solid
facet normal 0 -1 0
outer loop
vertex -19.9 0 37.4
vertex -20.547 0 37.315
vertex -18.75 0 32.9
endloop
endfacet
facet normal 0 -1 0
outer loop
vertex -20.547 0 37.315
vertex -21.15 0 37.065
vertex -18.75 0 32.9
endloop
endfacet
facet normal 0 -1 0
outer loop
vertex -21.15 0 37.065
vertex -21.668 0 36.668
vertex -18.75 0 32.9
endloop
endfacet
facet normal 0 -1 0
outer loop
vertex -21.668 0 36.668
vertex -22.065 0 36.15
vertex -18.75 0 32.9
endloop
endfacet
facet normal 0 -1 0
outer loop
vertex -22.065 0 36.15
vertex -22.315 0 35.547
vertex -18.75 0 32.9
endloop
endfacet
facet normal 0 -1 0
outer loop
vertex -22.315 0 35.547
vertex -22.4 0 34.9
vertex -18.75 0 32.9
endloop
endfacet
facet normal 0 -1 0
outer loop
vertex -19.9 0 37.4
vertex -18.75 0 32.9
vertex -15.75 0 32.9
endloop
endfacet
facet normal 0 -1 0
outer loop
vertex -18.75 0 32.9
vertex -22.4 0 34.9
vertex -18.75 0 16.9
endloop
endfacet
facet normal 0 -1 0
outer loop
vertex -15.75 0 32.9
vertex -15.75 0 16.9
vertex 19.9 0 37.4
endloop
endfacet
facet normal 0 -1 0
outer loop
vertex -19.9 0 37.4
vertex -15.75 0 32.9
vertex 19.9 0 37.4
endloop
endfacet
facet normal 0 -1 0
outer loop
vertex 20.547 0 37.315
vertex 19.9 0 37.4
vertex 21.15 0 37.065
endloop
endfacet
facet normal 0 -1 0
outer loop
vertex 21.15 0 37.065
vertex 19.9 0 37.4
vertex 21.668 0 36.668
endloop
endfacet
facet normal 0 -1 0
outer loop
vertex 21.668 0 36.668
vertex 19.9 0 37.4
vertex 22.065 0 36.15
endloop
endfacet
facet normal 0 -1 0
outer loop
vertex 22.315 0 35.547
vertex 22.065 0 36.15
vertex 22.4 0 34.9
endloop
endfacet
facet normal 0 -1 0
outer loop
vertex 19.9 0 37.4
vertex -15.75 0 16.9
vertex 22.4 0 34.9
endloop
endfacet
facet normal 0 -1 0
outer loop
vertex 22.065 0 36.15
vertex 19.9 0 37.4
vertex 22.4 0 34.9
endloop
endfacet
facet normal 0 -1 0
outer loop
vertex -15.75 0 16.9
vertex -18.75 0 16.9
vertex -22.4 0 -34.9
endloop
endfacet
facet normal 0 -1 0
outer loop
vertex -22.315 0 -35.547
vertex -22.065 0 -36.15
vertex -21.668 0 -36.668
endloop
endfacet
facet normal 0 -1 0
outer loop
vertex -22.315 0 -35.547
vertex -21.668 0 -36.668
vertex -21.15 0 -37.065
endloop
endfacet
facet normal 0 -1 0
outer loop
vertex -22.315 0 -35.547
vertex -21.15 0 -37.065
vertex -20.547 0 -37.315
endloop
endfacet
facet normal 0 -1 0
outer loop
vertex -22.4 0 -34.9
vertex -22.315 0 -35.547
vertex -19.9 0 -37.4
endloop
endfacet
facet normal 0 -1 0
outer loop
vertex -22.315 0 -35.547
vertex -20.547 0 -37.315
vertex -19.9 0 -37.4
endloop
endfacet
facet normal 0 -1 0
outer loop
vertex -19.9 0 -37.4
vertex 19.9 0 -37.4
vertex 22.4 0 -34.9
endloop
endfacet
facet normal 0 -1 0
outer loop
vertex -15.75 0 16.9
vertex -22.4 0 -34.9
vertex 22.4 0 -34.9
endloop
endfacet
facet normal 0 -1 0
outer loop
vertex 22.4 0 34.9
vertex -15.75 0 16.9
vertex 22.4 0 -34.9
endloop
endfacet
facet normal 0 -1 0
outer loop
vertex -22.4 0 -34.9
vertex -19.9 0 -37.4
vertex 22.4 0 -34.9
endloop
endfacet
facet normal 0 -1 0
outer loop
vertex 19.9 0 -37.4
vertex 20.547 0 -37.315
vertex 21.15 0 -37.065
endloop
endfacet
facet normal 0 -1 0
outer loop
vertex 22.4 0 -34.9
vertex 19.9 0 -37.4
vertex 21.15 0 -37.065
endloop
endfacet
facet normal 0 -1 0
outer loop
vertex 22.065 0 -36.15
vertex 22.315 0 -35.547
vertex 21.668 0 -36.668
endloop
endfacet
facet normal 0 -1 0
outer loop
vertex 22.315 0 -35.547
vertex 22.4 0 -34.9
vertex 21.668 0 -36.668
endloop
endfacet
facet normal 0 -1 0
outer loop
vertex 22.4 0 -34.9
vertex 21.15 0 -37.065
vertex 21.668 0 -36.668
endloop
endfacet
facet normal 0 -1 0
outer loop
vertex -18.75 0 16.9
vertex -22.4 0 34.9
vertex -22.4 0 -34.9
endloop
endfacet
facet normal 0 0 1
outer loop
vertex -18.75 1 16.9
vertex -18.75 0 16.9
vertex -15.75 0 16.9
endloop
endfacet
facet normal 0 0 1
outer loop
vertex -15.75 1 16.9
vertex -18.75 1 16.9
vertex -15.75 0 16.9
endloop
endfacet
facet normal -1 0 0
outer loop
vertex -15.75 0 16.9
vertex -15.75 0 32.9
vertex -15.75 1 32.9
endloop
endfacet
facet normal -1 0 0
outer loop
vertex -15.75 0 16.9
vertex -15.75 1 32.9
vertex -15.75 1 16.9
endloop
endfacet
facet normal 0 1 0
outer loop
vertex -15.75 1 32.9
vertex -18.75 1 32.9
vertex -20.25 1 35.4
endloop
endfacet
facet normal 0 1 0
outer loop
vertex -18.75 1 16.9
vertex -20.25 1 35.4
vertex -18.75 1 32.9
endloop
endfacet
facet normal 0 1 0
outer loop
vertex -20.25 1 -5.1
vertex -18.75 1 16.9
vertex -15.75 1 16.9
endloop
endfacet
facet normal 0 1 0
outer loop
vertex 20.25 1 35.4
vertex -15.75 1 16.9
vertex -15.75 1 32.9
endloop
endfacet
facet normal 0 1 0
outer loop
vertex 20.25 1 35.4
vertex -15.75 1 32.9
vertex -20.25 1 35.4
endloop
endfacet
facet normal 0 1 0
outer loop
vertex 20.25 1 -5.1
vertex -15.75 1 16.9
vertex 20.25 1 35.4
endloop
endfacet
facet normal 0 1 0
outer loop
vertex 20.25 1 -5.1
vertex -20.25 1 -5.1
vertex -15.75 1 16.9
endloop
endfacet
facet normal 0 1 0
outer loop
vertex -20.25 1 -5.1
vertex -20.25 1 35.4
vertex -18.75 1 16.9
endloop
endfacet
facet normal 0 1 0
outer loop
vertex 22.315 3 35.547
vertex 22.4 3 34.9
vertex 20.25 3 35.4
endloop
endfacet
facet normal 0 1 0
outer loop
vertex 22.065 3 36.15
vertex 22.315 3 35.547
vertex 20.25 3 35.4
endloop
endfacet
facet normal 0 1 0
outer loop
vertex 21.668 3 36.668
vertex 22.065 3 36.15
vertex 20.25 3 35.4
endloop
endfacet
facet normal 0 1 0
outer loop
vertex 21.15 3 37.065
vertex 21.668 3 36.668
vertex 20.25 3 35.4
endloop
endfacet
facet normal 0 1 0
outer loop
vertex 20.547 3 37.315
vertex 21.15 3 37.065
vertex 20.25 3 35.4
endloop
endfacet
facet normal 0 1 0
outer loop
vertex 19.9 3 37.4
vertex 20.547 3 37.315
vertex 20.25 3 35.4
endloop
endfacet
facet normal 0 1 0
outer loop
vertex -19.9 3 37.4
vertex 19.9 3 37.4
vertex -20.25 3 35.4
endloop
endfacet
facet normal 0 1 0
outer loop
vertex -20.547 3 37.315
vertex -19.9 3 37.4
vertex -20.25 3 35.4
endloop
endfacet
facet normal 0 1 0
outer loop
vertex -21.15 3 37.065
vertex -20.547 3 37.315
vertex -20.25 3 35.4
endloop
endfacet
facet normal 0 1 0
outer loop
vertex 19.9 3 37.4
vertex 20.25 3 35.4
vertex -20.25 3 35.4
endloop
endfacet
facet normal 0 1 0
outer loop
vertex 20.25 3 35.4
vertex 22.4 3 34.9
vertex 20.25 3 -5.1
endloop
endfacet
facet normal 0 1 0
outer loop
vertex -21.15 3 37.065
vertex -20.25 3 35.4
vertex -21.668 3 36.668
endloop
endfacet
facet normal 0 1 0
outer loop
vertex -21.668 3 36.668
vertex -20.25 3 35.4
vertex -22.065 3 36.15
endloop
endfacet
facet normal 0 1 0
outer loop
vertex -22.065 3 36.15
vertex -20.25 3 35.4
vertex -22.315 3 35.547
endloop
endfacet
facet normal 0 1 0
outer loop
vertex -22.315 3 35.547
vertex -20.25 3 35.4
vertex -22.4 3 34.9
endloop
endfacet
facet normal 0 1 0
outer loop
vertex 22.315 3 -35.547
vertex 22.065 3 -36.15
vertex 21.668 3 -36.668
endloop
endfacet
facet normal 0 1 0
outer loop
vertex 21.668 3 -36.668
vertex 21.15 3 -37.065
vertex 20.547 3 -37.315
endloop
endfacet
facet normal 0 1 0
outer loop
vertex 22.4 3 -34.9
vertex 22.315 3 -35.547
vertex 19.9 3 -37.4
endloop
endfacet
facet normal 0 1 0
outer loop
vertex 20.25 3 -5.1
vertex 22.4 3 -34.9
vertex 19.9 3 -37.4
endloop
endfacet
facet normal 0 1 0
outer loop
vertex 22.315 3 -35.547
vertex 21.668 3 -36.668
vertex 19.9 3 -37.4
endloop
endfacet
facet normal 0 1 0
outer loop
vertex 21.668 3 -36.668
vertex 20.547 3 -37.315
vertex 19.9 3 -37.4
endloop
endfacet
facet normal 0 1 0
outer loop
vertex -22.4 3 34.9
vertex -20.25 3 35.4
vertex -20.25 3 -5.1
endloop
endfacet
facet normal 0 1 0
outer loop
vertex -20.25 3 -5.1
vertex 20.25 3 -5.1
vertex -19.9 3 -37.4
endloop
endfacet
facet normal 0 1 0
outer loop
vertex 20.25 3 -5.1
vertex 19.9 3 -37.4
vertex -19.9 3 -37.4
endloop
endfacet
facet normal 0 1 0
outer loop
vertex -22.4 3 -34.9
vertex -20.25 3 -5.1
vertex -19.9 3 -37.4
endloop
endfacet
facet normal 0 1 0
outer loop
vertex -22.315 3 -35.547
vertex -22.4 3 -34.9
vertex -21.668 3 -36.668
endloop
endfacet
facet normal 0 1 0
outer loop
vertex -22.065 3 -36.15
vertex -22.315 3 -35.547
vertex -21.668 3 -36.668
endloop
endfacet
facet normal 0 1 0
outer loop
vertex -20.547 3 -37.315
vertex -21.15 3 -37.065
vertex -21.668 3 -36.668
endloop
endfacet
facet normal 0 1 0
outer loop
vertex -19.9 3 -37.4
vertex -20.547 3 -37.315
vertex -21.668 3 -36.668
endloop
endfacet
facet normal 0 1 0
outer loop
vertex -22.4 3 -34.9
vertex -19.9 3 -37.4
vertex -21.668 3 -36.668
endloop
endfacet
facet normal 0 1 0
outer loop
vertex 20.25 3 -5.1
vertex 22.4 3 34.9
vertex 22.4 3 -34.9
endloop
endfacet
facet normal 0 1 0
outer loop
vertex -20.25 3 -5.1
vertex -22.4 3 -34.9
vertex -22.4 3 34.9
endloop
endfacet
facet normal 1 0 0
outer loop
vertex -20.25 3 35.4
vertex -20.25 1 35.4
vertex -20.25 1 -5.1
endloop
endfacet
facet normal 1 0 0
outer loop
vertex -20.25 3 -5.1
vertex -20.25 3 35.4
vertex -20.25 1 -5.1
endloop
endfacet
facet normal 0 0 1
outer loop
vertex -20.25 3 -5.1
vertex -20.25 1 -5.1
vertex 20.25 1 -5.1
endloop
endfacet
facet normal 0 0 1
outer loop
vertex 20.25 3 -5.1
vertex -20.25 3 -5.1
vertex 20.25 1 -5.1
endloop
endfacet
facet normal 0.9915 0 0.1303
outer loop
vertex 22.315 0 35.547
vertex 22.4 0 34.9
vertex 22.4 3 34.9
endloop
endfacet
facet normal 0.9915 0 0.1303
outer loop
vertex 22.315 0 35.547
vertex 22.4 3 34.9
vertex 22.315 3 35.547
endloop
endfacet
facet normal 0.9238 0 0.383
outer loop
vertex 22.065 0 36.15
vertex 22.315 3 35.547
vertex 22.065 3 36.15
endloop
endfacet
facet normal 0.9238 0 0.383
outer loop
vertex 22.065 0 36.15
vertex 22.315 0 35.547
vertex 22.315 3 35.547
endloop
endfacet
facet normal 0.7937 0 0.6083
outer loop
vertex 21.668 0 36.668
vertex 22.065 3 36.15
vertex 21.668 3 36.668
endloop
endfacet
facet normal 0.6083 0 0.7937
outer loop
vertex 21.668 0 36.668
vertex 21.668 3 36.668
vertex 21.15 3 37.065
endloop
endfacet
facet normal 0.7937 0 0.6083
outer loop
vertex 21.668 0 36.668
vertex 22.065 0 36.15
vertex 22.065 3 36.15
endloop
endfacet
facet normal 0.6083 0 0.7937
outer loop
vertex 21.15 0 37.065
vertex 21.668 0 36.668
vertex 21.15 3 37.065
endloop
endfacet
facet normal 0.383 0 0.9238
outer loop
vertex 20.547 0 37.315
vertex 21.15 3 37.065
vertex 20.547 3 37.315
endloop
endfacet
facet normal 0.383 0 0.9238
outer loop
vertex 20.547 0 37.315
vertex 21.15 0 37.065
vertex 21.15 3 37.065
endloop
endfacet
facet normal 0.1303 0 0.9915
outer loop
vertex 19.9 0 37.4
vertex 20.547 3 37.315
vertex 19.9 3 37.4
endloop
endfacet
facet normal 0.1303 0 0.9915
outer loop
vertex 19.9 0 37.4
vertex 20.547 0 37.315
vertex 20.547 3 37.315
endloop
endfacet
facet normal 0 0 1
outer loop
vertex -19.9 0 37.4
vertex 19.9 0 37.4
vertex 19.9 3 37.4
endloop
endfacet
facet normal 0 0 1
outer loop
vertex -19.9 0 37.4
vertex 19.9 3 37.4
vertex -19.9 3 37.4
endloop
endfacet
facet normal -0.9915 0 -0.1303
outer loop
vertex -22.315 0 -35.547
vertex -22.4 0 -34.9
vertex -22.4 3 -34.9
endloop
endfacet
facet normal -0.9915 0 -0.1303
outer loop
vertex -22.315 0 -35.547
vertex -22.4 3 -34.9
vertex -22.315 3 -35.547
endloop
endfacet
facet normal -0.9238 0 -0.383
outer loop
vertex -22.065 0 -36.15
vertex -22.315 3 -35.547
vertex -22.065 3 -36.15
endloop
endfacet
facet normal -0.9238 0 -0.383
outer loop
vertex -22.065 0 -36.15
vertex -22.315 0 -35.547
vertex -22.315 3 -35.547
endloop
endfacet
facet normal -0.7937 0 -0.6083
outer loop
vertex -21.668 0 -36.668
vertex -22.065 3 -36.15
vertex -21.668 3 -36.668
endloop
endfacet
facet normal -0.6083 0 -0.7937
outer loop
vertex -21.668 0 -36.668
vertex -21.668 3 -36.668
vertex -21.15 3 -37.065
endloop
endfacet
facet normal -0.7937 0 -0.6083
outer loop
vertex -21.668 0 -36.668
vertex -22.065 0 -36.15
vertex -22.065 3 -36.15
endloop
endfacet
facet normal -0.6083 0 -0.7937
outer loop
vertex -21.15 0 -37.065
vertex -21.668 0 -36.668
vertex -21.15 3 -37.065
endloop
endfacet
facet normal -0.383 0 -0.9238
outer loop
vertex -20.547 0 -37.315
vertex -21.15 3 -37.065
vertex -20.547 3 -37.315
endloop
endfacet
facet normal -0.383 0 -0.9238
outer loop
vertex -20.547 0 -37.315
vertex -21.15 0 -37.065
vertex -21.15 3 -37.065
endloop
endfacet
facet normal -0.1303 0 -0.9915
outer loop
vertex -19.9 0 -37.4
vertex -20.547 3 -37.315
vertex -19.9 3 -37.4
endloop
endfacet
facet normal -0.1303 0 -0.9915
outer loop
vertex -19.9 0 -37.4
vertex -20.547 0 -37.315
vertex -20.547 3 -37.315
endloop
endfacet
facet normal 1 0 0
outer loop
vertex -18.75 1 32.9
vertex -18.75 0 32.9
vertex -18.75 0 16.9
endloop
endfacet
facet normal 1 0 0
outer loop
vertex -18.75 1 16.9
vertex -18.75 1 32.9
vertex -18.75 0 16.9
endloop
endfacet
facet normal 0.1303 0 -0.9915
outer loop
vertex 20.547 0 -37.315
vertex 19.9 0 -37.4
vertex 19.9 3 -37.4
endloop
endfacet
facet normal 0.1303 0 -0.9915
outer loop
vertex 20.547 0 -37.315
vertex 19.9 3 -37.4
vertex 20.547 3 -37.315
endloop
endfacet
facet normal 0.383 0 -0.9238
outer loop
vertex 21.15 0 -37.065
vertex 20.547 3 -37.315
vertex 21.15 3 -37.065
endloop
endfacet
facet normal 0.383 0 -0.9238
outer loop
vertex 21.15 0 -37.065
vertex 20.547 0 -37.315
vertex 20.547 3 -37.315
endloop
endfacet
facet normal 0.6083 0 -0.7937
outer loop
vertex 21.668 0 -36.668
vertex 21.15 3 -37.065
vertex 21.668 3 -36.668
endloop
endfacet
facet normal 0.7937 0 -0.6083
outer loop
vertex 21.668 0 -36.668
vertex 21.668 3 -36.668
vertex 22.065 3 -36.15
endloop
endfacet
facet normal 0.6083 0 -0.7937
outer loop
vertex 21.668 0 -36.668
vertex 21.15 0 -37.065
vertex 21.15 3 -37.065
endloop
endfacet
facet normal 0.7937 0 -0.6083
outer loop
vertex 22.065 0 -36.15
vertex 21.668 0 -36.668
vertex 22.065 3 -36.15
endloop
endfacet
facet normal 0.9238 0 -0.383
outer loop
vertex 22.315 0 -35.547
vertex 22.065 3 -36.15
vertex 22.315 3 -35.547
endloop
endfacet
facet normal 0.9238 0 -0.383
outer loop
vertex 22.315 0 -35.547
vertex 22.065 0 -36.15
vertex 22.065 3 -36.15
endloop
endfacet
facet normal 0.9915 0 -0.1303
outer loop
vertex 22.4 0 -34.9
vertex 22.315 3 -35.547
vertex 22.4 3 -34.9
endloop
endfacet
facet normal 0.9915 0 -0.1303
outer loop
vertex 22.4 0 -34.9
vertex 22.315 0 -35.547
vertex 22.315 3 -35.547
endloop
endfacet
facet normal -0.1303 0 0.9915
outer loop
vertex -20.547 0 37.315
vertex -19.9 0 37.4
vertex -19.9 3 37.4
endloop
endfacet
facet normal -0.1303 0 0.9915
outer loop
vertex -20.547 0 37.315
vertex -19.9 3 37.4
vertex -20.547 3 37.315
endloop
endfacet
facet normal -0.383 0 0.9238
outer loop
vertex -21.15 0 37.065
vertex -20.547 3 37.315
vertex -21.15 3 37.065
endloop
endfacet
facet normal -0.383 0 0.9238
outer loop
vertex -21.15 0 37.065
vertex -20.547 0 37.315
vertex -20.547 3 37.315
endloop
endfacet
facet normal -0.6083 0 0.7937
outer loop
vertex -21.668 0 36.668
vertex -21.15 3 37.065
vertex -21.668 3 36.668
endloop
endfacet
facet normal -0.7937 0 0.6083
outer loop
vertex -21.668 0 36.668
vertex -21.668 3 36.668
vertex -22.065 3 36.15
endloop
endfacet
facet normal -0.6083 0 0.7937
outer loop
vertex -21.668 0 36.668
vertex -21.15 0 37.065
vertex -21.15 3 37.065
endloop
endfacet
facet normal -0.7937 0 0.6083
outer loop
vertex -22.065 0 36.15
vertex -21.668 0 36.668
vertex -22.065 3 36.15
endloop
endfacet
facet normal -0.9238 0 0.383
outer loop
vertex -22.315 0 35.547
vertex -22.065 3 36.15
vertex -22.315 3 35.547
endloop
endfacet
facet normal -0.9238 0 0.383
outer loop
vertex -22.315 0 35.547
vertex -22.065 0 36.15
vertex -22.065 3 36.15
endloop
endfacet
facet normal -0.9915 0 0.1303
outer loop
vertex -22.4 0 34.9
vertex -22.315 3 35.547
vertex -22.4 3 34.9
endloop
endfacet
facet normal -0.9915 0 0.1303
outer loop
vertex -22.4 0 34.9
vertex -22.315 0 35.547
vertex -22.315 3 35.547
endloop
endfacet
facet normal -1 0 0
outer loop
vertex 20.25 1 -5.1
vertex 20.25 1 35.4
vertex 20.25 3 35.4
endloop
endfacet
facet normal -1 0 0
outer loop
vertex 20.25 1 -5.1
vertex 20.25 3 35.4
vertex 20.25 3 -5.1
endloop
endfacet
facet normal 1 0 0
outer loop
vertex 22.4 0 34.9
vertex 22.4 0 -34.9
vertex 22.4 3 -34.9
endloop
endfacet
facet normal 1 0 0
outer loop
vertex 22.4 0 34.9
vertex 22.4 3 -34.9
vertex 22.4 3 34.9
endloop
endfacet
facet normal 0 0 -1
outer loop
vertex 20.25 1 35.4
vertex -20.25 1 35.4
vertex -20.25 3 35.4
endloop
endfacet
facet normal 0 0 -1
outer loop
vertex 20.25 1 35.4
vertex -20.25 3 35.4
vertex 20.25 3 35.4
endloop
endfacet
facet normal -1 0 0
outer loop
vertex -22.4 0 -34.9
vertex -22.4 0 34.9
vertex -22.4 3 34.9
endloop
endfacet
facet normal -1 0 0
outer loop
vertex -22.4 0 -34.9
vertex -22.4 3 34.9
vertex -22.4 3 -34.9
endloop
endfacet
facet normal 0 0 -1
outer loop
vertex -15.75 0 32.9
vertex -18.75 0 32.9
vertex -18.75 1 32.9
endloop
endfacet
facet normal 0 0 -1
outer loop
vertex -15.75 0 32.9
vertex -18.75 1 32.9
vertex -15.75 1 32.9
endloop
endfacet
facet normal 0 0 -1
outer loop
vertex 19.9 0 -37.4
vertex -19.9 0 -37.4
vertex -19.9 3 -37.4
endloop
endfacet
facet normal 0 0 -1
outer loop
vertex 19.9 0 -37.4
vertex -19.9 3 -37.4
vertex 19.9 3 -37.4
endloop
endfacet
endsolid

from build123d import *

# Parameters (mm, degrees)
SKETCH1_W           = 40.5
SKETCH1_H           = 40.5
BOSS_EXTRUDE1_DEPTH = 3
SKETCH1_3_W         = 40.5
SKETCH1_3_H         = 40.5
SKETCH1_3_W_2       = 3
SKETCH1_3_H_2       = 16
BOSS_EXTRUDE2_DEPTH = 1


with BuildPart() as part:
    # Sketch1 → Boss-Extrude1 (new body)
    with BuildSketch(Plane(origin=(0, 0, 0), x_dir=(1, 0, 0), z_dir=(0, 1, 0))):
        with BuildLine():
            Line((19.9, 37.4), (-19.9, 37.4))
            ThreePointArc((-19.9, 37.4), (-21.667766953, 36.667766953), (-22.4, 34.9))
            Line((-22.4, 34.9), (-22.4, -34.9))
            ThreePointArc((-22.4, -34.9), (-21.667766953, -36.667766953), (-19.9, -37.4))
            Line((-19.9, -37.4), (19.9, -37.4))
            ThreePointArc((19.9, -37.4), (21.667766953, -36.667766953), (22.4, -34.9))
            Line((22.4, -34.9), (22.4, 34.9))
            ThreePointArc((22.4, 34.9), (21.667766953, 36.667766953), (19.9, 37.4))
        make_face()
        with Locations((0, -15.15)):
            Rectangle(SKETCH1_W, SKETCH1_H, mode=Mode.SUBTRACT)
    extrude(amount=BOSS_EXTRUDE1_DEPTH)

    # Sketch1<3> → Boss-Extrude2 (add)
    with BuildSketch(Plane(origin=(0, 0, 0), x_dir=(1, 0, 0), z_dir=(0, 1, 0))):
        with Locations((0, -15.15)):
            Rectangle(SKETCH1_3_W, SKETCH1_3_H)
        with Locations((-17.25, -24.9)):
            Rectangle(SKETCH1_3_W_2, SKETCH1_3_H_2, mode=Mode.SUBTRACT)
    extrude(amount=BOSS_EXTRUDE2_DEPTH)


solid = part.part
